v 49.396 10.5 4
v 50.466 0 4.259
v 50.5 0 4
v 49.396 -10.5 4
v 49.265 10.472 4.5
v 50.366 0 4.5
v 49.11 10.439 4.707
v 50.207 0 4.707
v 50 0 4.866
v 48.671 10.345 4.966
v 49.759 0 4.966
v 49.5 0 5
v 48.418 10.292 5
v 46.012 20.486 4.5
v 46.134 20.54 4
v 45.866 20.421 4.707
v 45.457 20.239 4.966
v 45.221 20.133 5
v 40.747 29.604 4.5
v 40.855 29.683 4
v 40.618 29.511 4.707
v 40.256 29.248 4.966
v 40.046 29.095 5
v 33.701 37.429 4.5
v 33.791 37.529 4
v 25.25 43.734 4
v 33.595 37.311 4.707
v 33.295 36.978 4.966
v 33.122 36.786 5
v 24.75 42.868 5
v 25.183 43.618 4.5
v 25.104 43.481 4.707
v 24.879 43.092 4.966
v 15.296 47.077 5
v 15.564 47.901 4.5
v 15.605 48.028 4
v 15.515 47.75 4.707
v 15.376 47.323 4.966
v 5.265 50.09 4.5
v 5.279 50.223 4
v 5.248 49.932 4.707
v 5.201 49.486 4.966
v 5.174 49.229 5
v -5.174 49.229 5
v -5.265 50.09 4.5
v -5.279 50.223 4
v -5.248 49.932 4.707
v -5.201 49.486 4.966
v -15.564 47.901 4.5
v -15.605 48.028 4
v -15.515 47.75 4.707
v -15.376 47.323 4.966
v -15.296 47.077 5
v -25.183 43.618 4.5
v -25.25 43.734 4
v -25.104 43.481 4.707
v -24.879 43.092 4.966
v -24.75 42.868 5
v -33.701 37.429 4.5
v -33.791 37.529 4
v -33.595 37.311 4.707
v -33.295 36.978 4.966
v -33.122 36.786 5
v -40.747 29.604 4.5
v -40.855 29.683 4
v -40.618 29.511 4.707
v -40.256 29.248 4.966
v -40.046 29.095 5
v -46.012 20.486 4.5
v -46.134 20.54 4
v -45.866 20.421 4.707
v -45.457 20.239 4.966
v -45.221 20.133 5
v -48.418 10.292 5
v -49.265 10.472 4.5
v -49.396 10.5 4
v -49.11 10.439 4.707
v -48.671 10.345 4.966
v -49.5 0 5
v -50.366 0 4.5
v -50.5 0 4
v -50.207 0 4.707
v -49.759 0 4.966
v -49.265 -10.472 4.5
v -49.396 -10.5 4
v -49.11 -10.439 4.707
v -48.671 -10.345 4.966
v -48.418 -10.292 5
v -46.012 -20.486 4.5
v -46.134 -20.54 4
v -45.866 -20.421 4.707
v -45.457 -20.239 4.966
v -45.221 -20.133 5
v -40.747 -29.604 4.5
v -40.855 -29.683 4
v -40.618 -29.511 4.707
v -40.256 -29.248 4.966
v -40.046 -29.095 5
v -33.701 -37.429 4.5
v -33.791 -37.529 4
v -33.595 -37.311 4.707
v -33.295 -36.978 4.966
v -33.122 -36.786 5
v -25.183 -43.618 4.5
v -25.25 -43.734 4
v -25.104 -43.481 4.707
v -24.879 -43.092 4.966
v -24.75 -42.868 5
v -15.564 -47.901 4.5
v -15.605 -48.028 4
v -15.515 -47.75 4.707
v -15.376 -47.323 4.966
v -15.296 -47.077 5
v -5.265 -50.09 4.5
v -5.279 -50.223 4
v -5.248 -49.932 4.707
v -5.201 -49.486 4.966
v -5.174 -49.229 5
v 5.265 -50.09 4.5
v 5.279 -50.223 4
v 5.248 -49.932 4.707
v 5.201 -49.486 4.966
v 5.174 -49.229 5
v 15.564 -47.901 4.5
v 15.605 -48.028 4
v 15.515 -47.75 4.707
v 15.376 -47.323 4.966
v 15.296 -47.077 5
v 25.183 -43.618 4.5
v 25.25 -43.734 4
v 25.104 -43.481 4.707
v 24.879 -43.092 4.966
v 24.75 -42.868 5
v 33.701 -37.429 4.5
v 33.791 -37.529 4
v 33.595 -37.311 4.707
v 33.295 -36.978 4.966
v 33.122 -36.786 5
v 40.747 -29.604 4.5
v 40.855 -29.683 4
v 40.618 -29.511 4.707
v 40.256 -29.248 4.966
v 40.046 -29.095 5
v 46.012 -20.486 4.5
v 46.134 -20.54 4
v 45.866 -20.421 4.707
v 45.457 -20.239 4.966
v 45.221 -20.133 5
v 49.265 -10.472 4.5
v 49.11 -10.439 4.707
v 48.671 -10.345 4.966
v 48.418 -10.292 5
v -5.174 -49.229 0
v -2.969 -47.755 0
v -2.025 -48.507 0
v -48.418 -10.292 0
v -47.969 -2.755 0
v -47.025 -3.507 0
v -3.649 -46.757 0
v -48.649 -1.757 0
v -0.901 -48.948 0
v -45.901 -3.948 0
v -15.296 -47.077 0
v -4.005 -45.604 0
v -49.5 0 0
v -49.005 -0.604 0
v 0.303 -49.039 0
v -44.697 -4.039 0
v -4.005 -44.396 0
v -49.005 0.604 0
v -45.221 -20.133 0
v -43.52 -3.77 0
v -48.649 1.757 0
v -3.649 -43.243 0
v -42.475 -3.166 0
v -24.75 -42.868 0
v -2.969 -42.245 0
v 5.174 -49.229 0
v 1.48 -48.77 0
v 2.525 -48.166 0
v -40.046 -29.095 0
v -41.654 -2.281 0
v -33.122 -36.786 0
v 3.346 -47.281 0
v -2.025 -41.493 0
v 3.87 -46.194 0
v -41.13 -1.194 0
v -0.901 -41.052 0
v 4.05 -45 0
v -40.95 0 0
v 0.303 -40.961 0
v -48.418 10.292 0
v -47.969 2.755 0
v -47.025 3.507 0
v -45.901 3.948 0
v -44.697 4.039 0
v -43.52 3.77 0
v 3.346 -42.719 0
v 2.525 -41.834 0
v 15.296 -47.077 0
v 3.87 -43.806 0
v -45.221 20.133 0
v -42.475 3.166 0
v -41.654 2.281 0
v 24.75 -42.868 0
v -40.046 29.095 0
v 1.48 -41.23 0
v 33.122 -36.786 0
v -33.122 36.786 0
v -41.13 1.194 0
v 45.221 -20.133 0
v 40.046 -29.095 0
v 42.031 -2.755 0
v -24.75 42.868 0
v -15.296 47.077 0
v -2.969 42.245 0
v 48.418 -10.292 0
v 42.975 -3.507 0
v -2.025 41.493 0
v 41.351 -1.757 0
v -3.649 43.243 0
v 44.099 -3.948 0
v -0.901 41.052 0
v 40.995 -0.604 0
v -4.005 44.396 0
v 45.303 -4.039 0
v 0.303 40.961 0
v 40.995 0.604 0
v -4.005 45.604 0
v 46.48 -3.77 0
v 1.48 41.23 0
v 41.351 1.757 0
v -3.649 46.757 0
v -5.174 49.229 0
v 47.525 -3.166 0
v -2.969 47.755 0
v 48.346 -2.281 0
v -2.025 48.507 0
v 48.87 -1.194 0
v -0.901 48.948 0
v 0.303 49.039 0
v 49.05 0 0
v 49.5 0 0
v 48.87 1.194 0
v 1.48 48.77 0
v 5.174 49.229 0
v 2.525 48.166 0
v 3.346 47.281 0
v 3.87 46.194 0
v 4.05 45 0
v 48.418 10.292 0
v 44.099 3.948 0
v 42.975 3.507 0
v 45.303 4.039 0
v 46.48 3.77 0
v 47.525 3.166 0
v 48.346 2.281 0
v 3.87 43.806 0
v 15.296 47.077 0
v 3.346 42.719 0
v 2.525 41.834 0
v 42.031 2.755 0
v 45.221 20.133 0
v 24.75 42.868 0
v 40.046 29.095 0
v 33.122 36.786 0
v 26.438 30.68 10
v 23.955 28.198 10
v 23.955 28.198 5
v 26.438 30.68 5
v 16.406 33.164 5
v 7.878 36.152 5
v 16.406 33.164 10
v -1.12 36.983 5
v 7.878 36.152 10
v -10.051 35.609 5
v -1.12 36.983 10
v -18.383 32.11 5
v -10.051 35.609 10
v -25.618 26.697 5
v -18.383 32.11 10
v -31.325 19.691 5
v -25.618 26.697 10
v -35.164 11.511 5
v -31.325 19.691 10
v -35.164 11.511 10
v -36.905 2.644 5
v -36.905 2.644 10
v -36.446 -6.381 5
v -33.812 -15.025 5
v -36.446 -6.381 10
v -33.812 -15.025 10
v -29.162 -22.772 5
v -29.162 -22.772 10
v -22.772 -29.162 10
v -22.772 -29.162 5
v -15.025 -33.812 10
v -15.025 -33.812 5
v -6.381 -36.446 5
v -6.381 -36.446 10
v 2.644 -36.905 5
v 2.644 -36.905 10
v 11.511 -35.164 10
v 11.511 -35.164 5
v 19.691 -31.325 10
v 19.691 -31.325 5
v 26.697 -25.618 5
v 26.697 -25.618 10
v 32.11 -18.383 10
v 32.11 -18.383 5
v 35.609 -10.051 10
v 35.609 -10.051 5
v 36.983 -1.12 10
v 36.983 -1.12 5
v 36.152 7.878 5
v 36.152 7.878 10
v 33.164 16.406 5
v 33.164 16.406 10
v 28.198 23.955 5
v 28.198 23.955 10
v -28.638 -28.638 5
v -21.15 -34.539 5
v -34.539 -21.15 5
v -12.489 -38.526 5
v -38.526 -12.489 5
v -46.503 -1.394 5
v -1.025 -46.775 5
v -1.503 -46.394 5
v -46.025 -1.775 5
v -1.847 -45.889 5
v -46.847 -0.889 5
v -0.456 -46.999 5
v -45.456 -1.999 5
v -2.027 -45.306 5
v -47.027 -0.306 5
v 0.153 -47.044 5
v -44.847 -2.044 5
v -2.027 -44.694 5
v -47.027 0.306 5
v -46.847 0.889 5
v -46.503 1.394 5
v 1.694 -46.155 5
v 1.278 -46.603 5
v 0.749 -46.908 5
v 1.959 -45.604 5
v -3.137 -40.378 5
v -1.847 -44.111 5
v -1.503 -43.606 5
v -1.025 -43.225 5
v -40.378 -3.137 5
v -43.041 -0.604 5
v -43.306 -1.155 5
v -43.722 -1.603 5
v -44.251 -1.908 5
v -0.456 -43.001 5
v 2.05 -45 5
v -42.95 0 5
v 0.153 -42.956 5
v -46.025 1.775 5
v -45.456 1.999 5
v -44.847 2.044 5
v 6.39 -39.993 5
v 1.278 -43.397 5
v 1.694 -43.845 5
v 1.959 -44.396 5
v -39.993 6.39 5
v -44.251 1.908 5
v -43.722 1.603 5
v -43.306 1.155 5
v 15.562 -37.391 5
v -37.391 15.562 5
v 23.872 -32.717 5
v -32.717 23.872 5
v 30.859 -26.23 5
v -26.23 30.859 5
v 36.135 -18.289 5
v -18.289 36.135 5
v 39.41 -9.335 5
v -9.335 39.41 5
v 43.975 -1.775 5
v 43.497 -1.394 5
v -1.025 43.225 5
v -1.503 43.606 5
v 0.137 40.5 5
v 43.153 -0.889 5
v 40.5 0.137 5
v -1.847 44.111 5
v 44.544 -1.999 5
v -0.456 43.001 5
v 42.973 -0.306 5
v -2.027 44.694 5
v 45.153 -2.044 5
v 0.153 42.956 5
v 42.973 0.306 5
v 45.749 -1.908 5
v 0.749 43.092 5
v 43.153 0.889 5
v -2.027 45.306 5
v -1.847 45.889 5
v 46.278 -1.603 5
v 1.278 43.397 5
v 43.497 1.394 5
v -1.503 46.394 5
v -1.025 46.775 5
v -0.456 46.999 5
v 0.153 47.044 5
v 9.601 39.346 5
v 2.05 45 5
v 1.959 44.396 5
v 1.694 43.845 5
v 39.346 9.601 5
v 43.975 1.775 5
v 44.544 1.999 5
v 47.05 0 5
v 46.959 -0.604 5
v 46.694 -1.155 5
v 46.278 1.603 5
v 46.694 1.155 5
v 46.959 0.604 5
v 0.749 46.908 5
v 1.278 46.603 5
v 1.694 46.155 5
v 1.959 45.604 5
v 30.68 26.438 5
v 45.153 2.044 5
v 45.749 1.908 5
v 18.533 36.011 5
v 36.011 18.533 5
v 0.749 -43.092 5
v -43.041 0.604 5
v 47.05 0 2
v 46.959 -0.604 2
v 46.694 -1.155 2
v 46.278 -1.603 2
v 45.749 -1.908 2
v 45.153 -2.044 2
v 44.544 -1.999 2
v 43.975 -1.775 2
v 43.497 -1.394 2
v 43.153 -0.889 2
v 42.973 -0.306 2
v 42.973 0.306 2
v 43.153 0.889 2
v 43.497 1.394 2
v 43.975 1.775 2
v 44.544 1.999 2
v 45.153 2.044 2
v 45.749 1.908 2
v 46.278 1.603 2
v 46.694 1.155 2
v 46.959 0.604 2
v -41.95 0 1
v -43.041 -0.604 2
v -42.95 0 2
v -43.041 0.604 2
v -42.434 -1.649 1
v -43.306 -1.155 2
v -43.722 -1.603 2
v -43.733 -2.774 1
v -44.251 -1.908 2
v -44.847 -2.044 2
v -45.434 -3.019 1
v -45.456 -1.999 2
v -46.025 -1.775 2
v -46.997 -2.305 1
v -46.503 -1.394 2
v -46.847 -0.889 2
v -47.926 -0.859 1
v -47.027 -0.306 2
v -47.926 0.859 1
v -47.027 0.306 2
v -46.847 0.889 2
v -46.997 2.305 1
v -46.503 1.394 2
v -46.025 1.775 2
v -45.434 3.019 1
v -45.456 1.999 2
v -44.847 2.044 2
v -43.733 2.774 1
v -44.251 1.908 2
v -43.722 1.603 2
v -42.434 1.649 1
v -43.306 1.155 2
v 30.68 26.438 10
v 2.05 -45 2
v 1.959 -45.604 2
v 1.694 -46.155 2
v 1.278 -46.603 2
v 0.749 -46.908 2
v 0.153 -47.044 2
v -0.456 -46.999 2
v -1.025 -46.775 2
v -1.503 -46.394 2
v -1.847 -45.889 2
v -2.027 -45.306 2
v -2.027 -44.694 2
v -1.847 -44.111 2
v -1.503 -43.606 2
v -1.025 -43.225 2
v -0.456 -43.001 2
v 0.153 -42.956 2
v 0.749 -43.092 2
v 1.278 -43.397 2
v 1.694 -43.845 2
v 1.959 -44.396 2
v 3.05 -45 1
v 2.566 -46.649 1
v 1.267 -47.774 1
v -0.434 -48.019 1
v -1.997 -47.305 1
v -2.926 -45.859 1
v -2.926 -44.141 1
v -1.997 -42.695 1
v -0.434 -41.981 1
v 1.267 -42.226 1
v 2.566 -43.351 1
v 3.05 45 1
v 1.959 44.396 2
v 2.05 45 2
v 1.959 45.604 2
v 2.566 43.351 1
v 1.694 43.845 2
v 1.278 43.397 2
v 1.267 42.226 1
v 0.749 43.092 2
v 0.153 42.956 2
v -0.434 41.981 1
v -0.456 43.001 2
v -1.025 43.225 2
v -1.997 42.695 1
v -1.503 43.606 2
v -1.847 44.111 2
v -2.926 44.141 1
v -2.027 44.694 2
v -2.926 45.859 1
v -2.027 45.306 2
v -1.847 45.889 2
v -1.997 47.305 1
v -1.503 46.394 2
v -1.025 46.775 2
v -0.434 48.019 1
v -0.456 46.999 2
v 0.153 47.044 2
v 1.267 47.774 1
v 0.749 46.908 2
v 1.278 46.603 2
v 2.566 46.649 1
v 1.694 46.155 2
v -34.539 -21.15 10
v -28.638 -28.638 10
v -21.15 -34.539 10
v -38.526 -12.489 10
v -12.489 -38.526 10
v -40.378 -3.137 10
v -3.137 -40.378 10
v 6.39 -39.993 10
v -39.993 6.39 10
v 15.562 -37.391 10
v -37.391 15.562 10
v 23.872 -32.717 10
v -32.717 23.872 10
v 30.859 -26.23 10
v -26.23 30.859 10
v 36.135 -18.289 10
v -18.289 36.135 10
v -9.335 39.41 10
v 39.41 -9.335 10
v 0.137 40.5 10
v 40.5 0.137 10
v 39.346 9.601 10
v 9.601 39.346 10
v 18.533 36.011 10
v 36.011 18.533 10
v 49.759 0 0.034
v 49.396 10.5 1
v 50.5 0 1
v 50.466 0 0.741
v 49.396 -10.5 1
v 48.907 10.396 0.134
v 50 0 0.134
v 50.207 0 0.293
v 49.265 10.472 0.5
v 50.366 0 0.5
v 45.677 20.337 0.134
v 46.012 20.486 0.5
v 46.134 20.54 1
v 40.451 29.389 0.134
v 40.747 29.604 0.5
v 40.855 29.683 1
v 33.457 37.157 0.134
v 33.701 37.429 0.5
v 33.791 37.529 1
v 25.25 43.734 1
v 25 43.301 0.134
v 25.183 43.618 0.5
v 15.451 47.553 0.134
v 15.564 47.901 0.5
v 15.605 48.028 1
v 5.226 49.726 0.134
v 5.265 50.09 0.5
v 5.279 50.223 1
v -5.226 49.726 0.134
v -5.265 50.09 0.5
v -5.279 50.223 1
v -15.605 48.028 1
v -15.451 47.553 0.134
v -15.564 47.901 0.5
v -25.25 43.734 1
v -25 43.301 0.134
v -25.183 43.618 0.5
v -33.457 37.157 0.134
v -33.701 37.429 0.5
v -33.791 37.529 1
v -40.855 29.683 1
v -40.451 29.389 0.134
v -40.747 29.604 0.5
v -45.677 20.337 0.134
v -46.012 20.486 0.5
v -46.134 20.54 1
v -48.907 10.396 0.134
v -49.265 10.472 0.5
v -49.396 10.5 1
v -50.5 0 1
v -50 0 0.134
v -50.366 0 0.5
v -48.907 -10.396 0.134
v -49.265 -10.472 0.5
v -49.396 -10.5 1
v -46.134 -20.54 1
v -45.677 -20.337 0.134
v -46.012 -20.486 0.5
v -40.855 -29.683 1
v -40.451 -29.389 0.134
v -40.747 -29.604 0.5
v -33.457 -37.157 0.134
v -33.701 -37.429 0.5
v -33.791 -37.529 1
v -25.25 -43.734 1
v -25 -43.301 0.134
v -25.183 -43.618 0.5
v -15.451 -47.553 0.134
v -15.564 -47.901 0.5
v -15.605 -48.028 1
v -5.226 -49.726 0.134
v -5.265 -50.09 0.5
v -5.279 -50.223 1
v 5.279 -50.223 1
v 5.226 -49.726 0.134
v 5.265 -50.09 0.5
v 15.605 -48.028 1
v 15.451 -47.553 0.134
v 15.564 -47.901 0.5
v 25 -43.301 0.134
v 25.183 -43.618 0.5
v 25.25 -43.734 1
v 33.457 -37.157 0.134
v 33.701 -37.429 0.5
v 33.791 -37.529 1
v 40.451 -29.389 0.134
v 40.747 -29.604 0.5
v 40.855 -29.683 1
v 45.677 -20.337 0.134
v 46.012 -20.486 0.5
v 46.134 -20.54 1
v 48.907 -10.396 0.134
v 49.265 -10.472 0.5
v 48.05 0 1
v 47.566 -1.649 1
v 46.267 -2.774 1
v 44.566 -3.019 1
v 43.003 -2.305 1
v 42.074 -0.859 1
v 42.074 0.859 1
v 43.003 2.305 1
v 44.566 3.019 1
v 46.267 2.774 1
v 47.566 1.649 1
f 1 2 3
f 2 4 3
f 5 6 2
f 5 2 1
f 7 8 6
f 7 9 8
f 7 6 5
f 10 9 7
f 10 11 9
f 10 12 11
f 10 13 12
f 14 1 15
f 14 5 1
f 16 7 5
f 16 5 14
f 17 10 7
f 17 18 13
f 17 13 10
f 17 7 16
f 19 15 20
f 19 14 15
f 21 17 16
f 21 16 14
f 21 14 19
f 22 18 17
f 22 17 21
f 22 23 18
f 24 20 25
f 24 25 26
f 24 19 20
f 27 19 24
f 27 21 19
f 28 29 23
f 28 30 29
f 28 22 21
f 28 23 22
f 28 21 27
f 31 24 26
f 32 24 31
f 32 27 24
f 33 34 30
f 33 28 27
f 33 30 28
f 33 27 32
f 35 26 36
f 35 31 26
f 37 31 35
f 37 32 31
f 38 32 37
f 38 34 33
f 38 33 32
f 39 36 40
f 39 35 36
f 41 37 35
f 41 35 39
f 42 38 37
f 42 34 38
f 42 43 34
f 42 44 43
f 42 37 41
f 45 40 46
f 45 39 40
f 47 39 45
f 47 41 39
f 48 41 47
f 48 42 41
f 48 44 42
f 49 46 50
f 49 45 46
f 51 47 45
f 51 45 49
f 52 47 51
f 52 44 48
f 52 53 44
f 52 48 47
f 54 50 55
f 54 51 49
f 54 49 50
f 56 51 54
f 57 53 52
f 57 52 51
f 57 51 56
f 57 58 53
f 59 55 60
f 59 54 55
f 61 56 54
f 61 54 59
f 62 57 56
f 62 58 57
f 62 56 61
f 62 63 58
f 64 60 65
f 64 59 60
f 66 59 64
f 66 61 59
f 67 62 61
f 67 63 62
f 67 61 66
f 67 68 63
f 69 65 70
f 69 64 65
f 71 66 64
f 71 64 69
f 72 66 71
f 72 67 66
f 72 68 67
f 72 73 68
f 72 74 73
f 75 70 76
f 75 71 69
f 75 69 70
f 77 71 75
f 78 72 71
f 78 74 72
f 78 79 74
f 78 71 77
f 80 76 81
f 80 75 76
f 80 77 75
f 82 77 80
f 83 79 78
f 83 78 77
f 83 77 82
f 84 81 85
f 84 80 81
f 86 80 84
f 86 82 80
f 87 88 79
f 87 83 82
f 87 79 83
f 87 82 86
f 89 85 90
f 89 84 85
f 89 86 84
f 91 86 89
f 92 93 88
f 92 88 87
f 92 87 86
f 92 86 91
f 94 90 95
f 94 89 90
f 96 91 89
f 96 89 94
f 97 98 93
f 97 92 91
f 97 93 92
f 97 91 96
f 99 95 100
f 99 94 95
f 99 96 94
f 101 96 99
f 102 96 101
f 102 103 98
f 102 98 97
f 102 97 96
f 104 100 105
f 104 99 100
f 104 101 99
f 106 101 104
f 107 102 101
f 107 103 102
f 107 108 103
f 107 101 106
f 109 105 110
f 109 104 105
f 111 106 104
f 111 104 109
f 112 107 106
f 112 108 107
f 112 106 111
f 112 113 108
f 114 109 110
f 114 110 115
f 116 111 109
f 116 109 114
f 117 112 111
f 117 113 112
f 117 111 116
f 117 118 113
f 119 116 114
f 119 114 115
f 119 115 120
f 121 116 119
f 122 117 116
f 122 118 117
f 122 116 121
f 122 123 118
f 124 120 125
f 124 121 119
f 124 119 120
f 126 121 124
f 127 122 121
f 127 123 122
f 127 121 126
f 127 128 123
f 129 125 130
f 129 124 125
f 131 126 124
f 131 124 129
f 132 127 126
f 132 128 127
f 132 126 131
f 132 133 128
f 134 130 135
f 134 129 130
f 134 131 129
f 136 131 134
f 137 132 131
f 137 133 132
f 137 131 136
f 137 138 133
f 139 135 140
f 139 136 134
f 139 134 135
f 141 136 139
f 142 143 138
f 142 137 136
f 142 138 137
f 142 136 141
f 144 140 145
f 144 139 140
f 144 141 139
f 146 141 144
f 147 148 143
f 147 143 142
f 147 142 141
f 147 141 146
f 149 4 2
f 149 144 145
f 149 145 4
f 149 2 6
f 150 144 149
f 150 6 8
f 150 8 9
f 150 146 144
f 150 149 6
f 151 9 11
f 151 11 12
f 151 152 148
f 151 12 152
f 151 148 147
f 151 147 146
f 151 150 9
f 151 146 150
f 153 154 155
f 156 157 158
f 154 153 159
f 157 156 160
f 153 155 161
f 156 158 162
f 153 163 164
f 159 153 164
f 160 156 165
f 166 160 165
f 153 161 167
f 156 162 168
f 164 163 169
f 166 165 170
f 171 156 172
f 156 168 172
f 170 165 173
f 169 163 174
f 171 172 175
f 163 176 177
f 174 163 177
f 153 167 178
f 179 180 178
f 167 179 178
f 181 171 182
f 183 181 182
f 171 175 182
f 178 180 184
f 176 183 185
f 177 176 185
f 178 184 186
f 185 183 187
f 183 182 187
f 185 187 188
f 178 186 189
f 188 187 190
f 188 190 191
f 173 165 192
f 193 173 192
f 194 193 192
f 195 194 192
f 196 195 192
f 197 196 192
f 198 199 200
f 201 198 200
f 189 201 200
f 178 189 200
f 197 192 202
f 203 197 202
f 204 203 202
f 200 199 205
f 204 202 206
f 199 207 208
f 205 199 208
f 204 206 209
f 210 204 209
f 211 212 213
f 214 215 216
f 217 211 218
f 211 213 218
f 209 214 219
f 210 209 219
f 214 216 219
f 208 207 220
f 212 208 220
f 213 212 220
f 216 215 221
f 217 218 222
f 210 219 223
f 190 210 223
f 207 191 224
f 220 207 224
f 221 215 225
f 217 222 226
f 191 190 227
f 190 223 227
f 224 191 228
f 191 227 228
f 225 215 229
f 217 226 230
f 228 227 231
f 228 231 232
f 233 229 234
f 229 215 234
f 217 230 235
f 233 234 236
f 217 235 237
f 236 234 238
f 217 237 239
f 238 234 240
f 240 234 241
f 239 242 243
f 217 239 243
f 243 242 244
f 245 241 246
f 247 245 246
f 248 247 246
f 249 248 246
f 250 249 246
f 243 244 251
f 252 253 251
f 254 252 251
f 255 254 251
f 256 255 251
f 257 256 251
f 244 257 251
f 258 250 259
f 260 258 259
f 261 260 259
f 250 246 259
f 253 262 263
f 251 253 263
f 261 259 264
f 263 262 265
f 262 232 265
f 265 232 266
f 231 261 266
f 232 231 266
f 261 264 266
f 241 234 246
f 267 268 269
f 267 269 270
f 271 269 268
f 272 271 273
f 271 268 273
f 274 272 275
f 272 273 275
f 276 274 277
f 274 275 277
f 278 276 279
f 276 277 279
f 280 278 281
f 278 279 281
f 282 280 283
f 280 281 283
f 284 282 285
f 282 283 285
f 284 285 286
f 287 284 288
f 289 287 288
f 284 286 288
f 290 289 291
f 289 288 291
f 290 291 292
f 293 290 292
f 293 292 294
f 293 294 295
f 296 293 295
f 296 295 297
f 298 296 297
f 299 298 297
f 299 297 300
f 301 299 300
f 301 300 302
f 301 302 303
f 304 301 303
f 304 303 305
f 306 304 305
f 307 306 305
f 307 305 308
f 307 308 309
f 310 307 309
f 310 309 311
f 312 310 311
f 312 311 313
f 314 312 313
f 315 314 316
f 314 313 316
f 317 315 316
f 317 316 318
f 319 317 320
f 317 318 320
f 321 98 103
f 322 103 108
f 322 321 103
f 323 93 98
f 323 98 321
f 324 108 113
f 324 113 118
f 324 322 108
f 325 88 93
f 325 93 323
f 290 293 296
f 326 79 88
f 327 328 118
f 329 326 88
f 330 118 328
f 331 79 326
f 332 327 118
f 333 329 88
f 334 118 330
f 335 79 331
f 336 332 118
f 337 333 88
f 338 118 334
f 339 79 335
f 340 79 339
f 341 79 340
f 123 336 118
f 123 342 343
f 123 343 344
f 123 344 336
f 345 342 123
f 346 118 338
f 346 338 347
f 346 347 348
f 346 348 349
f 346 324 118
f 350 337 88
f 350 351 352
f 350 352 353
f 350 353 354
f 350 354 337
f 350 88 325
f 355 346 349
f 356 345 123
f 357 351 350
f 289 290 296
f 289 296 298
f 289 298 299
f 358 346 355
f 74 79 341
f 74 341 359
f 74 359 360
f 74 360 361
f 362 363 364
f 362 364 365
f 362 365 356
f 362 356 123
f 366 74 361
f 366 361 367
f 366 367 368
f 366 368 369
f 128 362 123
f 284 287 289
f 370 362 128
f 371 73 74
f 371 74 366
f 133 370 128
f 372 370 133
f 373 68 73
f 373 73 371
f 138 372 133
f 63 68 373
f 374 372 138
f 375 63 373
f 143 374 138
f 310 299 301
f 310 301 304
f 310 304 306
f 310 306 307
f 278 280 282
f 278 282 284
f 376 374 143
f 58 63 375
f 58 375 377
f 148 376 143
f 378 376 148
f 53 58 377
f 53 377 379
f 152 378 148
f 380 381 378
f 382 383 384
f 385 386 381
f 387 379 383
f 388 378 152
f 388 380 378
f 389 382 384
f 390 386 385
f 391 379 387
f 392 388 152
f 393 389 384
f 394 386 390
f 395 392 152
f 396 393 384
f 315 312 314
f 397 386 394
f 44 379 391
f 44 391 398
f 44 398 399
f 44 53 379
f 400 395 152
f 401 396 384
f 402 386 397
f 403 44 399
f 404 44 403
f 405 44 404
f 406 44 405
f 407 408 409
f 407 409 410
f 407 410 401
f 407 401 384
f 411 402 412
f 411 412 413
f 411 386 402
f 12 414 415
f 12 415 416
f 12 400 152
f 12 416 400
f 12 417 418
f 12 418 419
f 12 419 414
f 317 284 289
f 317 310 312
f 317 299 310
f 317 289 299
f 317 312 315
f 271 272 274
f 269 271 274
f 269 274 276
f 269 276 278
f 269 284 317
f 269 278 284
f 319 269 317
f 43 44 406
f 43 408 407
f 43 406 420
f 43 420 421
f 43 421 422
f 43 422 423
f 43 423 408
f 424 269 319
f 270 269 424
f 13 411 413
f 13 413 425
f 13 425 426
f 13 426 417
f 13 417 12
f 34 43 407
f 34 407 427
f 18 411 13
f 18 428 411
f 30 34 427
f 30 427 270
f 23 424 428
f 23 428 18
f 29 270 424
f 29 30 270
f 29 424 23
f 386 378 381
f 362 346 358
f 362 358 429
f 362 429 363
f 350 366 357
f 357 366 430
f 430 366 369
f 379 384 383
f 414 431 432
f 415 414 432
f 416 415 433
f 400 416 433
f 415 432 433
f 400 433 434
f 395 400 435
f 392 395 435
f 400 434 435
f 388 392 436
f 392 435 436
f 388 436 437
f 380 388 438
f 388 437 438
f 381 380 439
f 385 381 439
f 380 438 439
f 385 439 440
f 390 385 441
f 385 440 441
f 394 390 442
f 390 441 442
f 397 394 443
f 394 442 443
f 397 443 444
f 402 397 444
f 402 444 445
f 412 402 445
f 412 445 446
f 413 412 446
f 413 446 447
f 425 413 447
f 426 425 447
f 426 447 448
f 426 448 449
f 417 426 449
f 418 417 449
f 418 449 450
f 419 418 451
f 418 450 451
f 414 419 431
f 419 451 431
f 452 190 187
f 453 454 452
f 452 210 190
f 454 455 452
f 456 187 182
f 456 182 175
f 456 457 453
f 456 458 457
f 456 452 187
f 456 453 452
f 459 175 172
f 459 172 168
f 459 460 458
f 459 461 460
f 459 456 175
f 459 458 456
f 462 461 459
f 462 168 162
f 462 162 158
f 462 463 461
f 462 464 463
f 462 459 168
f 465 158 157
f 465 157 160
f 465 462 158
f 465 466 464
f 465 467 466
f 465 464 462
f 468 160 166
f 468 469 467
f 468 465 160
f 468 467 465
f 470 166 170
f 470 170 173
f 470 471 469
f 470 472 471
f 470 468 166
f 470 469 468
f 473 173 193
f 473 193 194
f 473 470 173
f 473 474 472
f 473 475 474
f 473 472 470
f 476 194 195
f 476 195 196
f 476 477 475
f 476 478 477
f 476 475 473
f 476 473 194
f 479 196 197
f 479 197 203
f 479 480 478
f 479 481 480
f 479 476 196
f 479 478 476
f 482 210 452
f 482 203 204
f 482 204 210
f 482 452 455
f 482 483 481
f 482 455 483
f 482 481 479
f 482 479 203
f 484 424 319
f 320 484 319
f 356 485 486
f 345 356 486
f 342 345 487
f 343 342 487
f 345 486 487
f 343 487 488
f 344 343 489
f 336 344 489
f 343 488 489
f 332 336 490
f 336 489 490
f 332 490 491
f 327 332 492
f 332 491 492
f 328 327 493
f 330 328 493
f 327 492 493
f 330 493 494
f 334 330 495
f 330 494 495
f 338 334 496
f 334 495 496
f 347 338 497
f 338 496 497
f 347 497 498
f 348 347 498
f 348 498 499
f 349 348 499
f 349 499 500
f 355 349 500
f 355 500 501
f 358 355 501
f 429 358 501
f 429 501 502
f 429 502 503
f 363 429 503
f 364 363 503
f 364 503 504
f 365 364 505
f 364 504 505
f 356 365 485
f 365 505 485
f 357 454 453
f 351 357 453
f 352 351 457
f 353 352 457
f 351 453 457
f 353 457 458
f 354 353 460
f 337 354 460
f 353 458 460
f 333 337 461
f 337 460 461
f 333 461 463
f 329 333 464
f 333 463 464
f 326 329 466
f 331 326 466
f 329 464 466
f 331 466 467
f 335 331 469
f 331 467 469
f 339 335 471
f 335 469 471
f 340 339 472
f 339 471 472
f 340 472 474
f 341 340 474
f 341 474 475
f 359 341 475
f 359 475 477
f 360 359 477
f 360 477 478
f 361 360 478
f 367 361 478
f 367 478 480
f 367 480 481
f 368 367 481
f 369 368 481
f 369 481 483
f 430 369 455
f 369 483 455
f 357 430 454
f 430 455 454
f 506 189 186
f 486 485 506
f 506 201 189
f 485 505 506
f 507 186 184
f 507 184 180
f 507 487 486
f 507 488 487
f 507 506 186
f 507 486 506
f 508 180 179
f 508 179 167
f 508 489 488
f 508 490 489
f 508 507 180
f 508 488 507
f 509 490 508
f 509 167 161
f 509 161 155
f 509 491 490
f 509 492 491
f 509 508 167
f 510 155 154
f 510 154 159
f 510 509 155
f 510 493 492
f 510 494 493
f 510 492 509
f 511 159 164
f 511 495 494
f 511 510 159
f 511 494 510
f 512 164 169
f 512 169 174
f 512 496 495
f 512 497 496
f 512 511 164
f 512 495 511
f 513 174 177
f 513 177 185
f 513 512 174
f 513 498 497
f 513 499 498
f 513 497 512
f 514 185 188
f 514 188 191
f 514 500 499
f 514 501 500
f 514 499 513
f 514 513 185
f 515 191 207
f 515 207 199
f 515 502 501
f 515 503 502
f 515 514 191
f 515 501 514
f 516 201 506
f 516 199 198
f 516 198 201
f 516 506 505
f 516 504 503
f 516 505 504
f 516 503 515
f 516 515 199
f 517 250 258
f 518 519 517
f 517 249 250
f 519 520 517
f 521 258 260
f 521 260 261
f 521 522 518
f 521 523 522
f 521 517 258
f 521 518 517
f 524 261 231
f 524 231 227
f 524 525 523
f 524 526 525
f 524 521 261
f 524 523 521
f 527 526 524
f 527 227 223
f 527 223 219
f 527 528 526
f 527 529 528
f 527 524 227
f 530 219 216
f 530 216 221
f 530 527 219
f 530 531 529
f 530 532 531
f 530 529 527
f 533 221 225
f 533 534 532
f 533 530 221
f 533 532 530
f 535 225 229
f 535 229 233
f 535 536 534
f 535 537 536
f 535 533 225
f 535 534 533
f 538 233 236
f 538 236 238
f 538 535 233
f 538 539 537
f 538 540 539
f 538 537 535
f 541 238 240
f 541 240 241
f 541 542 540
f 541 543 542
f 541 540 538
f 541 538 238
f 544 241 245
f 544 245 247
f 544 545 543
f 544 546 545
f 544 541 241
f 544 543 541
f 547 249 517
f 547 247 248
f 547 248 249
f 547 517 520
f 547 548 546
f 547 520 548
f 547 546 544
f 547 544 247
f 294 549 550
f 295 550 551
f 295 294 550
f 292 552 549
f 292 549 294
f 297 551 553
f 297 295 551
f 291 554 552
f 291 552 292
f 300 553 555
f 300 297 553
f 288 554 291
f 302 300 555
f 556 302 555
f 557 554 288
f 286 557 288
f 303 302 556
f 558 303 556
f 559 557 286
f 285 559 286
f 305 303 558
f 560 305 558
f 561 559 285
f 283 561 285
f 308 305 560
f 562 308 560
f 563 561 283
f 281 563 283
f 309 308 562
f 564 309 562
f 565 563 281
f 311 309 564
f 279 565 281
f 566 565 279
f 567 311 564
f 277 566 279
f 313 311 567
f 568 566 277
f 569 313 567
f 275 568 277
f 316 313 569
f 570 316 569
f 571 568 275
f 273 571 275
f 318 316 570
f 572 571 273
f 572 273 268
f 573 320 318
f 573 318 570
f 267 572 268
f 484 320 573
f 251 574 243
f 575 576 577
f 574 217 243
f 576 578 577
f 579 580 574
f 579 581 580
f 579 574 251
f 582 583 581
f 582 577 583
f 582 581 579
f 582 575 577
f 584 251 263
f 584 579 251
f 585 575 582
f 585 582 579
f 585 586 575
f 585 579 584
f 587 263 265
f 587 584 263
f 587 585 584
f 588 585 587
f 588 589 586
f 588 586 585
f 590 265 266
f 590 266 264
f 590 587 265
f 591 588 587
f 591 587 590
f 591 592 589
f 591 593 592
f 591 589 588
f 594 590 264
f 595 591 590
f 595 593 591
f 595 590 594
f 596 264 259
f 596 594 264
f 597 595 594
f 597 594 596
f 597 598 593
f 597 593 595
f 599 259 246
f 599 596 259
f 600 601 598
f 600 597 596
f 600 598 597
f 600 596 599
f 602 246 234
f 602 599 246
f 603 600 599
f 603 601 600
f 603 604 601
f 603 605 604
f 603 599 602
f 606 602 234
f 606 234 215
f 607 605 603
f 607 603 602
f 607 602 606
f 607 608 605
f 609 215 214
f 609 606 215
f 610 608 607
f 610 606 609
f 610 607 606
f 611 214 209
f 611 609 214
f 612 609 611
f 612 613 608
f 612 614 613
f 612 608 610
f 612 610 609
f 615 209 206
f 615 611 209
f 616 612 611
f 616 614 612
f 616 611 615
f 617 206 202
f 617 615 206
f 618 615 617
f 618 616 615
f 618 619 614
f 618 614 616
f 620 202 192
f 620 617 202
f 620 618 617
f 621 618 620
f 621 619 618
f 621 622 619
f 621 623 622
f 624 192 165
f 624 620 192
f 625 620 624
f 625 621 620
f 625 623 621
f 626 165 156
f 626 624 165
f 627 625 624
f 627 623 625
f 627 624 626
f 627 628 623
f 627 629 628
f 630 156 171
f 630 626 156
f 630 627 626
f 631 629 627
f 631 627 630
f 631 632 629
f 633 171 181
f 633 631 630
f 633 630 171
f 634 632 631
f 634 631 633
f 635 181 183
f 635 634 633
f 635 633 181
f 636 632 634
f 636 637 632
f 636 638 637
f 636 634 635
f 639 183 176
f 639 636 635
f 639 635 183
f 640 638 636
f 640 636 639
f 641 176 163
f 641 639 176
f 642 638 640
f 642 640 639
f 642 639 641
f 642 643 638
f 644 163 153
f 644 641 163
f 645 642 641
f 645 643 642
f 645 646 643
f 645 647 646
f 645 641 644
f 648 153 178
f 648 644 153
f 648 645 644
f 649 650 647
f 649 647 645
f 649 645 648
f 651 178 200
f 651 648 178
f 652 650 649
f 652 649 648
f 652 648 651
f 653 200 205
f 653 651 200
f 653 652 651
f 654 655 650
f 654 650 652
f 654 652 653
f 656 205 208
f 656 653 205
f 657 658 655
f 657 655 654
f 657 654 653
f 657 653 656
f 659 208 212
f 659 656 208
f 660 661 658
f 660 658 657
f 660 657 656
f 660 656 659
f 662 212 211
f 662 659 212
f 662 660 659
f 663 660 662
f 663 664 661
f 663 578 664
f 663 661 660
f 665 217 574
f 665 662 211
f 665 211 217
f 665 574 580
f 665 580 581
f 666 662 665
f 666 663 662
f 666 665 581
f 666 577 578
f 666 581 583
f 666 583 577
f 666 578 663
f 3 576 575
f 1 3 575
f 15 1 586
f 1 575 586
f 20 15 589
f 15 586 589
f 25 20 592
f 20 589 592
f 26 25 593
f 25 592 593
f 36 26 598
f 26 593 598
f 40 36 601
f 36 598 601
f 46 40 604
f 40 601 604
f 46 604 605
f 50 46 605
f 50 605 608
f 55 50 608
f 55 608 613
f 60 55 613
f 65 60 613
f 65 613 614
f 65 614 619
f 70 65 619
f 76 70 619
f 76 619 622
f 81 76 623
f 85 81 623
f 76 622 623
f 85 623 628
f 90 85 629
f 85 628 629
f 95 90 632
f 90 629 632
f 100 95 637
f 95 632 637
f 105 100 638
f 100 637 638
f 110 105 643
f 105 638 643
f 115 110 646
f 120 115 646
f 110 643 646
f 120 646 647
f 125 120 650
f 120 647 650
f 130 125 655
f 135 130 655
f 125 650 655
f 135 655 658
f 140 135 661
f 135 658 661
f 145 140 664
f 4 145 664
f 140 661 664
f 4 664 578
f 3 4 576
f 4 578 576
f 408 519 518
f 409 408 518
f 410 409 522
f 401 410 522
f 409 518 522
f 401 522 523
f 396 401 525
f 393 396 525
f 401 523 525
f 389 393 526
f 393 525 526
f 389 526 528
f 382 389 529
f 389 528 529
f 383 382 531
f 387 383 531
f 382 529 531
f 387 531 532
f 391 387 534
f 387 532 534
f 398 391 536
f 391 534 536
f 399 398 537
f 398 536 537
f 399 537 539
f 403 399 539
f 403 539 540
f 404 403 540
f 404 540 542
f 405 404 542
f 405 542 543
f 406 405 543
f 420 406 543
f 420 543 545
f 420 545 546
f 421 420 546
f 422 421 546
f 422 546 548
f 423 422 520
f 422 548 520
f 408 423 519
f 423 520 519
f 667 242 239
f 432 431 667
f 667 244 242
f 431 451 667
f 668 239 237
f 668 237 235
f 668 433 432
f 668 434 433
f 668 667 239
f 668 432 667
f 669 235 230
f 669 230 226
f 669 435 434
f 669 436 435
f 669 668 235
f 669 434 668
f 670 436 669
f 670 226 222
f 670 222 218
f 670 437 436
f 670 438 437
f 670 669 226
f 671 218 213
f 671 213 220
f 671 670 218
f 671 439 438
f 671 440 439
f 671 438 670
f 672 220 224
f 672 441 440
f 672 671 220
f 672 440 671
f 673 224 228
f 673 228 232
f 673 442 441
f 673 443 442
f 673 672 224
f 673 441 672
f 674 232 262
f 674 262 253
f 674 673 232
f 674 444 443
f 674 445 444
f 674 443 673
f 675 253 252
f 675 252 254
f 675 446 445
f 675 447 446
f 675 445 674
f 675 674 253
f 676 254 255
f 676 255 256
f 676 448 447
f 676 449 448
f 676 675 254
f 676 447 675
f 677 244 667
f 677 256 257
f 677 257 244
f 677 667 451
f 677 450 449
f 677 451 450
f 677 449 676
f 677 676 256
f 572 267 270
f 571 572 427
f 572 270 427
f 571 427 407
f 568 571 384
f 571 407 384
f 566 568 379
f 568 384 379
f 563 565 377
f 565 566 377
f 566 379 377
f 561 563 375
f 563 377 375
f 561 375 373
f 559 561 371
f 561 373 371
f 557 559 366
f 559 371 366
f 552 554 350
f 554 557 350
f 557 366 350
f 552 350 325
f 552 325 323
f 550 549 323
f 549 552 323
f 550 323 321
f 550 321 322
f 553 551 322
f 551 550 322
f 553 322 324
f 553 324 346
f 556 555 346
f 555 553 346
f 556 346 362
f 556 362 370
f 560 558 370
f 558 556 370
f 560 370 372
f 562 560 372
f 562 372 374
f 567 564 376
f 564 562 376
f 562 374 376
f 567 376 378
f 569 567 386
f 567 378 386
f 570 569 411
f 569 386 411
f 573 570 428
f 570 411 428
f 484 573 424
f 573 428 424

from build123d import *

# Parameters (mm, degrees)
SKETCH_R        = 50.5
PAD_DEPTH       = 5
SKETCH001_R     = 40.5
PAD001_DEPTH    = 5
SKETCH002_R     = 37
POCKET_DEPTH    = 5
POCKET001_DEPTH = 5
SKETCH004_R     = 2.05
POCKET002_DEPTH = 5
CHAMFER_SIZE    = 2
FILLET_R        = 1


with BuildPart() as part:
    # Sketch → Pad (new body)
    with BuildSketch(Plane.XY):
        Circle(SKETCH_R)
    extrude(amount=PAD_DEPTH)

    # Sketch001 (on Face3 of Pad) → Pad001 (join)
    with BuildSketch(Plane.XY.offset(5)):
        Circle(SKETCH001_R)
    extrude(amount=PAD001_DEPTH)

    # Sketch002 (on Face5 of Pad001) → Pocket (cut)
    with BuildSketch(Plane.XY.offset(10)):
        Circle(SKETCH002_R)
    extrude(amount=-POCKET_DEPTH, mode=Mode.SUBTRACT)

    # Sketch003 (on Face5 of Pocket) → Pocket001 (cut)
    with BuildSketch(Plane.XY.offset(10)):
        Polygon((26.870058, 31.112698), (31.112698, 26.870058), (26.870058, 22.627417), (22.627417, 26.870058), align=None)
    extrude(amount=-POCKET001_DEPTH, mode=Mode.SUBTRACT)

    # Sketch004 (on Face2 of Pocket001) → Pocket002 (cut)
    with BuildSketch(Plane(origin=(0, 0, 0), x_dir=(1, 0, 0), z_dir=(0, 0, -1))):
        with Locations((0, 45)):
            Circle(SKETCH004_R)
        with Locations((-45, 0)):
            Circle(SKETCH004_R)
        with Locations((45, 0)):
            Circle(SKETCH004_R)
        with Locations((0, -45)):
            Circle(SKETCH004_R)
    extrude(amount=-POCKET002_DEPTH, mode=Mode.SUBTRACT)

    # Chamfer
    chamfer_edges = [part.edges().sort_by_distance(p)[0] for p in [
        (42.95, 0, 0),
        (-2.05, 45, 0),
        (-47.05, 0, 0),
        (-2.05, -45, 0),
    ]]
    chamfer(chamfer_edges, length=CHAMFER_SIZE)

    # Fillet
    fillet_edges = [part.edges().sort_by_distance(p)[0] for p in [
        (-50.5, 0, 0),
        (-50.5, 0, 5),
    ]]
    fillet(fillet_edges, radius=FILLET_R)


solid = part.part
